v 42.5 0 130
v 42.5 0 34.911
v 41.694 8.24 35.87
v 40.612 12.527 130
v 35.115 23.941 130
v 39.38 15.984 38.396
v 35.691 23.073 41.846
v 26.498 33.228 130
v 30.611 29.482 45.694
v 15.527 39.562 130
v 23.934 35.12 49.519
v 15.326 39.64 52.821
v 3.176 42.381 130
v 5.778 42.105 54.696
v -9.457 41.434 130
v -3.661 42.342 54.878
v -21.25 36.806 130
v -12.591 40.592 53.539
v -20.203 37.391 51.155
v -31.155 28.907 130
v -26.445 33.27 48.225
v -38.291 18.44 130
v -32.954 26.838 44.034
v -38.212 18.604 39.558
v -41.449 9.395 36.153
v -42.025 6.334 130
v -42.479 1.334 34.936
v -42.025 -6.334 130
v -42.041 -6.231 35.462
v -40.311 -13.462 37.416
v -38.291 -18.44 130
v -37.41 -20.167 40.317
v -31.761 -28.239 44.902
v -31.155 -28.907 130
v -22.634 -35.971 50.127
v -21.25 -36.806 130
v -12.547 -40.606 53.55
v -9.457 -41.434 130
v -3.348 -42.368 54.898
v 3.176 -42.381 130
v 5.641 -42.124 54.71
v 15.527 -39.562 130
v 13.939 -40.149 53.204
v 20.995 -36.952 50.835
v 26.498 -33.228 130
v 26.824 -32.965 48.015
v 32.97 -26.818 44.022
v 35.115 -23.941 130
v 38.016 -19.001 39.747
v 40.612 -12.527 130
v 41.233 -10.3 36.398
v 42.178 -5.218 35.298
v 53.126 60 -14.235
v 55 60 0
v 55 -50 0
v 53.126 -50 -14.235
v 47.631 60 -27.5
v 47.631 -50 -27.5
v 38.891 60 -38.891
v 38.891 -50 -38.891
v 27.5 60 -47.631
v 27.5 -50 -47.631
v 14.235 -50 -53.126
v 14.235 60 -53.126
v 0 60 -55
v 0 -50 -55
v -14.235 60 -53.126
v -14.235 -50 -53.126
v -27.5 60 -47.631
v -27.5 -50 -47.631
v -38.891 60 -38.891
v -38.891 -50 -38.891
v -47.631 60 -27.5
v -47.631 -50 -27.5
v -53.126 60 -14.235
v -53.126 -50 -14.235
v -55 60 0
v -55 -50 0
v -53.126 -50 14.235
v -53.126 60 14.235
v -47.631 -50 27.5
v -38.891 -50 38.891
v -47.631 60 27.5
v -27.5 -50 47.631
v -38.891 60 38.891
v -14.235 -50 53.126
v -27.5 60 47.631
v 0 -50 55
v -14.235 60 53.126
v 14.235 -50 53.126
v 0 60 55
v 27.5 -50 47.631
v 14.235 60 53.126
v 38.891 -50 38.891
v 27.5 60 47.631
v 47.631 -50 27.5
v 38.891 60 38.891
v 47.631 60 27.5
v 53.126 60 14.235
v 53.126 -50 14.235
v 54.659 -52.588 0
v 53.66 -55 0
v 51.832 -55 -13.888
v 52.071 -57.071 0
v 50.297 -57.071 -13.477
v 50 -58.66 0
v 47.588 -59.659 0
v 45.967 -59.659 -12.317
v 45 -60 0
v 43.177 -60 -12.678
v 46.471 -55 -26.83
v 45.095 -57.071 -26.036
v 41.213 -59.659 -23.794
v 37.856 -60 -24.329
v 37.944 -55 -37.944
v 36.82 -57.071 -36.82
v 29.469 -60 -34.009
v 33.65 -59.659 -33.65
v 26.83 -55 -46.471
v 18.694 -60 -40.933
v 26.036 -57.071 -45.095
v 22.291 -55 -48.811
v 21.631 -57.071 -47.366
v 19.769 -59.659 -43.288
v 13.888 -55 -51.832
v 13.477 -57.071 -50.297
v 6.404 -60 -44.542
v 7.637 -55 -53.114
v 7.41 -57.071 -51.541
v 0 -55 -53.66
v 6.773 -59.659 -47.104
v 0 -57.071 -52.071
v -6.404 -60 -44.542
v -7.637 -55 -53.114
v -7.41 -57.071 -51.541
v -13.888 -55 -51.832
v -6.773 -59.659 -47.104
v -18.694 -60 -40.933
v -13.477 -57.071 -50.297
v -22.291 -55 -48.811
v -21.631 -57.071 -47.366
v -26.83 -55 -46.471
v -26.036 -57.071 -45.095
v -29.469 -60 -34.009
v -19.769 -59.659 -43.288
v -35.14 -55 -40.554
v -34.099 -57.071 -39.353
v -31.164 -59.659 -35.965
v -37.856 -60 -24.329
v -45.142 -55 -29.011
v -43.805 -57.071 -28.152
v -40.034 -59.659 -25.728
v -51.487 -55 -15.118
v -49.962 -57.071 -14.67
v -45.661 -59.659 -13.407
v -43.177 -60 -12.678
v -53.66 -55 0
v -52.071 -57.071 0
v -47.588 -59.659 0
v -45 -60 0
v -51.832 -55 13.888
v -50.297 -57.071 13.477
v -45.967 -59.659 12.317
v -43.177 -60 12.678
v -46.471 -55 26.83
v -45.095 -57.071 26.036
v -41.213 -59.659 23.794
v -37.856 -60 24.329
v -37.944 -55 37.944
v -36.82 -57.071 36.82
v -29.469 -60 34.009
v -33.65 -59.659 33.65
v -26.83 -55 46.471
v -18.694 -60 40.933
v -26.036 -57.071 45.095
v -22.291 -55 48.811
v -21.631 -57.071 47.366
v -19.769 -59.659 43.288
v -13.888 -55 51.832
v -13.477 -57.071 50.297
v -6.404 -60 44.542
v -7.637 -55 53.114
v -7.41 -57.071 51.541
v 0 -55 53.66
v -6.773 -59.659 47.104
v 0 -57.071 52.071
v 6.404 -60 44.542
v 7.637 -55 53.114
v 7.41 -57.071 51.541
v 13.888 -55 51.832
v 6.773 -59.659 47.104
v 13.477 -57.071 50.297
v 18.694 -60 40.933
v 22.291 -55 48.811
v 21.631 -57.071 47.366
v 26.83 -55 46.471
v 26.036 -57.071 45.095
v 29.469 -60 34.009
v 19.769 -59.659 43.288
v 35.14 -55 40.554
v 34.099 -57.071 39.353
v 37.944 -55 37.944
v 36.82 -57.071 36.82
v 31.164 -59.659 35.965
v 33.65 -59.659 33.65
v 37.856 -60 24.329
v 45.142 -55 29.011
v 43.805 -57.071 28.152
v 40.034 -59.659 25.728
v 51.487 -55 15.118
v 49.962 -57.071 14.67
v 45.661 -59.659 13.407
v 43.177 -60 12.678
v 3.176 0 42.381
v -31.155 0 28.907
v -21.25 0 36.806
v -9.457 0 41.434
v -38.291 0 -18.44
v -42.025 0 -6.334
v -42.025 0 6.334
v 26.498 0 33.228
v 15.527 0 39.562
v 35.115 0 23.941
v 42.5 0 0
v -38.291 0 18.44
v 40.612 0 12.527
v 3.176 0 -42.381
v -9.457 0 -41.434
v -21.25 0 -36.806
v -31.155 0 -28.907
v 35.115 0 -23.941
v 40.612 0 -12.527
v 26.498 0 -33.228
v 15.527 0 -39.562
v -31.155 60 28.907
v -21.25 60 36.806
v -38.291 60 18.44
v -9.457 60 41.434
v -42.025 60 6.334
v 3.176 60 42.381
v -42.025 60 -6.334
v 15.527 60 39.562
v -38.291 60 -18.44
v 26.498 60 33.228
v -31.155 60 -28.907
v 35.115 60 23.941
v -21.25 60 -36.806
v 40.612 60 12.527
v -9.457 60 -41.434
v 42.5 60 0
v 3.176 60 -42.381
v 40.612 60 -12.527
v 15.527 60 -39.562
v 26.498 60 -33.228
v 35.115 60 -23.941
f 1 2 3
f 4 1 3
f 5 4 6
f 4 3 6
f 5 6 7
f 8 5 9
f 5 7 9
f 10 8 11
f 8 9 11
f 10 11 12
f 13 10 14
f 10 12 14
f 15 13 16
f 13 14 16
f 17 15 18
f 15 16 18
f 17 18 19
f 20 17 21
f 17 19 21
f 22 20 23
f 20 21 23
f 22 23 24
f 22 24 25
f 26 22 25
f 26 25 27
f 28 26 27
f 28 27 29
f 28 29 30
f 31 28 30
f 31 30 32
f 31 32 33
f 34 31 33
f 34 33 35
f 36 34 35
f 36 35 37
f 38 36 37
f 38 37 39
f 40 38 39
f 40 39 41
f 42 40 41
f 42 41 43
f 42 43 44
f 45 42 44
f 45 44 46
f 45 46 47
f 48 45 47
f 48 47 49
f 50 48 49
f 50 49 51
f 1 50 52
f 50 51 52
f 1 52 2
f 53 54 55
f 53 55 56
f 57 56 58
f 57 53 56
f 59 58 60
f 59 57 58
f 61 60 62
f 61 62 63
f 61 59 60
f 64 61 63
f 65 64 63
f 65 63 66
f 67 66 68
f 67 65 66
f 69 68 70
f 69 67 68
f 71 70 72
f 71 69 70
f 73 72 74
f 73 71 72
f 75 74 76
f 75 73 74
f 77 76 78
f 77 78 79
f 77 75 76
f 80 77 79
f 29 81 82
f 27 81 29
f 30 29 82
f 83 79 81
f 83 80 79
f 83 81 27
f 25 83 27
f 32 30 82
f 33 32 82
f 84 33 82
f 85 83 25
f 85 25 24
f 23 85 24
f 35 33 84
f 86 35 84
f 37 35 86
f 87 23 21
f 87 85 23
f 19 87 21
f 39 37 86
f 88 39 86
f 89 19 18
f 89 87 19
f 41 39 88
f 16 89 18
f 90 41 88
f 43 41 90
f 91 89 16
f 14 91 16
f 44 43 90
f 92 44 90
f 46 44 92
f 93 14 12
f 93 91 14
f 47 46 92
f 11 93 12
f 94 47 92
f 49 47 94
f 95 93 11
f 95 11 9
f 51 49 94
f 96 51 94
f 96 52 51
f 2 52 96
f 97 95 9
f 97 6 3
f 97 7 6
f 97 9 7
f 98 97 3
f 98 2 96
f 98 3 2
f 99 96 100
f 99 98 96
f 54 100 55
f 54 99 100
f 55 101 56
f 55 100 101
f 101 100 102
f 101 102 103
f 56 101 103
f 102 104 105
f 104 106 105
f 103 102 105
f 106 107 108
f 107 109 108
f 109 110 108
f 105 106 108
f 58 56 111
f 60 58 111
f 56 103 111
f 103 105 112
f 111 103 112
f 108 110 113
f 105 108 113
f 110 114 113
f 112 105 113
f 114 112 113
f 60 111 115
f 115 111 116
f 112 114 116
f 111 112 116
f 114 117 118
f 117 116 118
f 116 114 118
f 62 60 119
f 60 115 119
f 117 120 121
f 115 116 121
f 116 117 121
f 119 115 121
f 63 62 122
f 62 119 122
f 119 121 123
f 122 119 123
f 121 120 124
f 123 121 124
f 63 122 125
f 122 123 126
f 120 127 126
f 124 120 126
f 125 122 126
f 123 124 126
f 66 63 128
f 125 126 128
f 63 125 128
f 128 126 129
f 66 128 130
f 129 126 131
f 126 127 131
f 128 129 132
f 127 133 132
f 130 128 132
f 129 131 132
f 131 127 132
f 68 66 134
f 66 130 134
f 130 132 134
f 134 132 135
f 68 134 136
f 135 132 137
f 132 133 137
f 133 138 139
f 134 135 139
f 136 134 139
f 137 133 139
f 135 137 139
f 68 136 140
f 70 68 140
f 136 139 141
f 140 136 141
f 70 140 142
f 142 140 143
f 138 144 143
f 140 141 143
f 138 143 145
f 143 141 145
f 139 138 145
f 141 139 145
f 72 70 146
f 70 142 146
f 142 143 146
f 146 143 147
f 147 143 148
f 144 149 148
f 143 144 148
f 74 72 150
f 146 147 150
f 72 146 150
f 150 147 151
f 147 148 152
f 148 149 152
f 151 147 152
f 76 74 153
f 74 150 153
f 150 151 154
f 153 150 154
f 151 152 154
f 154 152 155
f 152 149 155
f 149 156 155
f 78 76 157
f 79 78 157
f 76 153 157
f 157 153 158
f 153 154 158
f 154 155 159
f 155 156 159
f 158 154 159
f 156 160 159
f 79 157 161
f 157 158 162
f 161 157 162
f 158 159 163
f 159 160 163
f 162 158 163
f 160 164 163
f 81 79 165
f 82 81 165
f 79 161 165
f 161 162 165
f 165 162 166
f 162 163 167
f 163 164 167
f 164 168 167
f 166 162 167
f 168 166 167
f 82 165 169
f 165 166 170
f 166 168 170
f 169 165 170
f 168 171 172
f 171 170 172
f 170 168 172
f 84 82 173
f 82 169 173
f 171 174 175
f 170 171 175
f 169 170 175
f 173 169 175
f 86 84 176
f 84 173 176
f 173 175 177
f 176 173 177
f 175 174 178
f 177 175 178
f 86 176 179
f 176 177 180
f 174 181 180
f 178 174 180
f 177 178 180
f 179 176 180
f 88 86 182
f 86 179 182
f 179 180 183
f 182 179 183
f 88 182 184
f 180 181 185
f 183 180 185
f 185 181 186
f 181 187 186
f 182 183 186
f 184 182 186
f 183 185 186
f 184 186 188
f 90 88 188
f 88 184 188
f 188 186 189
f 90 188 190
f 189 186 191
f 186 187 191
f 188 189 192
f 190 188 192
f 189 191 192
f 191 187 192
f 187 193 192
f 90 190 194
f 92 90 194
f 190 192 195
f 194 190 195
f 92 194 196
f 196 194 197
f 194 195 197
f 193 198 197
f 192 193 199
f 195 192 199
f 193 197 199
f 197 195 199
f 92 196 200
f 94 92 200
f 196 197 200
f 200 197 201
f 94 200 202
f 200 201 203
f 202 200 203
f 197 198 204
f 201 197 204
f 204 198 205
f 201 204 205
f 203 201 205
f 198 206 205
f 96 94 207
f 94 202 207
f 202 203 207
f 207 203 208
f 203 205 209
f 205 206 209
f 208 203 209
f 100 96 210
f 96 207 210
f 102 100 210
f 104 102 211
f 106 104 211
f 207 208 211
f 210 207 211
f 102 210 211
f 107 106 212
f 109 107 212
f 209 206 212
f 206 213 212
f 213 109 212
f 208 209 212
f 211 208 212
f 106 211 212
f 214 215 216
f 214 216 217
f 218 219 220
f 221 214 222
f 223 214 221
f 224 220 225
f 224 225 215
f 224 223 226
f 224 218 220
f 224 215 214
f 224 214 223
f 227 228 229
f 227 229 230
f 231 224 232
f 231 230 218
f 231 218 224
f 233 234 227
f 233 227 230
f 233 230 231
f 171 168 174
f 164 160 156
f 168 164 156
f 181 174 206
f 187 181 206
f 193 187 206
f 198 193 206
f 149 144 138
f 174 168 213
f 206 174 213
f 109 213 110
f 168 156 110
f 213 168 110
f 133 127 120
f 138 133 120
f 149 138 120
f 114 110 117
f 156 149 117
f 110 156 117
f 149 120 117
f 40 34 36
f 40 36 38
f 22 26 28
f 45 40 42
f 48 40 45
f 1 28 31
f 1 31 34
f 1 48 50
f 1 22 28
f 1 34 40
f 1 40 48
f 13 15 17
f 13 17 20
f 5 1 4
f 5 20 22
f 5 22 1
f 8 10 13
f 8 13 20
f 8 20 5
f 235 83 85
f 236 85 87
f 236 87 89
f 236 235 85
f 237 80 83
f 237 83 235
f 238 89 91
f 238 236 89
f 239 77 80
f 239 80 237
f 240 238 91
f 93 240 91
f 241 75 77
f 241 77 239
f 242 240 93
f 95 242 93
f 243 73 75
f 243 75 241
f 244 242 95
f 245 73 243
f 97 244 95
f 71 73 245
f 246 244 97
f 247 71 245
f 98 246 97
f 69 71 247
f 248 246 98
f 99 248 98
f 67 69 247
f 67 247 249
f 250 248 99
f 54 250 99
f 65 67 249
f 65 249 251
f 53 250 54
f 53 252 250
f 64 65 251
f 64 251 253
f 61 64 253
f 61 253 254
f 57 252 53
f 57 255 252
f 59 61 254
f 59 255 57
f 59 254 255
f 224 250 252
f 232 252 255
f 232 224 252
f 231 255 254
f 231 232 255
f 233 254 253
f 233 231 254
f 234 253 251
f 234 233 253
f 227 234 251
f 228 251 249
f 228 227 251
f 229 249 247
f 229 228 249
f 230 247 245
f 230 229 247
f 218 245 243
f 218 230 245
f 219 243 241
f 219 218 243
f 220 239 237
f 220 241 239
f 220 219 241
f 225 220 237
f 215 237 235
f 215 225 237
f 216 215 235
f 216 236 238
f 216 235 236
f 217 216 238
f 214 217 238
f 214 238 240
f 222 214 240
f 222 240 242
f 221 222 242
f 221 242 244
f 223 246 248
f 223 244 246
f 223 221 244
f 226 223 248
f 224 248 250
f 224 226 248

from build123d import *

# Parameters (mm, degrees)
SKETCH1_R           = 55
BOSS_EXTRUDE1_DEPTH = 60
SKETCH2_R           = 42.5
BOSS_EXTRUDE2_DEPTH = 130
FILLET2_R           = 10
SKETCH3_R           = 42.5
CUT_EXTRUDE1_DEPTH  = 110


with BuildPart() as part:
    # Sketch1 → Boss-Extrude1 (new body, symmetric)
    with BuildSketch(Plane(origin=(0, 0, 0), x_dir=(1, 0, 0), z_dir=(0, 1, 0))):
        Circle(SKETCH1_R)
    extrude(amount=BOSS_EXTRUDE1_DEPTH, both=True)

    # Sketch2 → Boss-Extrude2 (add)
    with BuildSketch(Plane.XY):
        Circle(SKETCH2_R)
    extrude(amount=BOSS_EXTRUDE2_DEPTH)

    # Fillet2
    fillet2_edges = [part.edges().sort_by_distance(p)[0] for p in [
        (-55, -60, 0),
    ]]
    fillet(fillet2_edges, radius=FILLET2_R)

    # Sketch3 → Cut-Extrude1 (cut)
    with BuildSketch(Plane(origin=(0, 0, 0), x_dir=(1, 0, 0), z_dir=(0, 1, 0))):
        Circle(SKETCH3_R)
    extrude(amount=CUT_EXTRUDE1_DEPTH, mode=Mode.SUBTRACT)


solid = part.part
